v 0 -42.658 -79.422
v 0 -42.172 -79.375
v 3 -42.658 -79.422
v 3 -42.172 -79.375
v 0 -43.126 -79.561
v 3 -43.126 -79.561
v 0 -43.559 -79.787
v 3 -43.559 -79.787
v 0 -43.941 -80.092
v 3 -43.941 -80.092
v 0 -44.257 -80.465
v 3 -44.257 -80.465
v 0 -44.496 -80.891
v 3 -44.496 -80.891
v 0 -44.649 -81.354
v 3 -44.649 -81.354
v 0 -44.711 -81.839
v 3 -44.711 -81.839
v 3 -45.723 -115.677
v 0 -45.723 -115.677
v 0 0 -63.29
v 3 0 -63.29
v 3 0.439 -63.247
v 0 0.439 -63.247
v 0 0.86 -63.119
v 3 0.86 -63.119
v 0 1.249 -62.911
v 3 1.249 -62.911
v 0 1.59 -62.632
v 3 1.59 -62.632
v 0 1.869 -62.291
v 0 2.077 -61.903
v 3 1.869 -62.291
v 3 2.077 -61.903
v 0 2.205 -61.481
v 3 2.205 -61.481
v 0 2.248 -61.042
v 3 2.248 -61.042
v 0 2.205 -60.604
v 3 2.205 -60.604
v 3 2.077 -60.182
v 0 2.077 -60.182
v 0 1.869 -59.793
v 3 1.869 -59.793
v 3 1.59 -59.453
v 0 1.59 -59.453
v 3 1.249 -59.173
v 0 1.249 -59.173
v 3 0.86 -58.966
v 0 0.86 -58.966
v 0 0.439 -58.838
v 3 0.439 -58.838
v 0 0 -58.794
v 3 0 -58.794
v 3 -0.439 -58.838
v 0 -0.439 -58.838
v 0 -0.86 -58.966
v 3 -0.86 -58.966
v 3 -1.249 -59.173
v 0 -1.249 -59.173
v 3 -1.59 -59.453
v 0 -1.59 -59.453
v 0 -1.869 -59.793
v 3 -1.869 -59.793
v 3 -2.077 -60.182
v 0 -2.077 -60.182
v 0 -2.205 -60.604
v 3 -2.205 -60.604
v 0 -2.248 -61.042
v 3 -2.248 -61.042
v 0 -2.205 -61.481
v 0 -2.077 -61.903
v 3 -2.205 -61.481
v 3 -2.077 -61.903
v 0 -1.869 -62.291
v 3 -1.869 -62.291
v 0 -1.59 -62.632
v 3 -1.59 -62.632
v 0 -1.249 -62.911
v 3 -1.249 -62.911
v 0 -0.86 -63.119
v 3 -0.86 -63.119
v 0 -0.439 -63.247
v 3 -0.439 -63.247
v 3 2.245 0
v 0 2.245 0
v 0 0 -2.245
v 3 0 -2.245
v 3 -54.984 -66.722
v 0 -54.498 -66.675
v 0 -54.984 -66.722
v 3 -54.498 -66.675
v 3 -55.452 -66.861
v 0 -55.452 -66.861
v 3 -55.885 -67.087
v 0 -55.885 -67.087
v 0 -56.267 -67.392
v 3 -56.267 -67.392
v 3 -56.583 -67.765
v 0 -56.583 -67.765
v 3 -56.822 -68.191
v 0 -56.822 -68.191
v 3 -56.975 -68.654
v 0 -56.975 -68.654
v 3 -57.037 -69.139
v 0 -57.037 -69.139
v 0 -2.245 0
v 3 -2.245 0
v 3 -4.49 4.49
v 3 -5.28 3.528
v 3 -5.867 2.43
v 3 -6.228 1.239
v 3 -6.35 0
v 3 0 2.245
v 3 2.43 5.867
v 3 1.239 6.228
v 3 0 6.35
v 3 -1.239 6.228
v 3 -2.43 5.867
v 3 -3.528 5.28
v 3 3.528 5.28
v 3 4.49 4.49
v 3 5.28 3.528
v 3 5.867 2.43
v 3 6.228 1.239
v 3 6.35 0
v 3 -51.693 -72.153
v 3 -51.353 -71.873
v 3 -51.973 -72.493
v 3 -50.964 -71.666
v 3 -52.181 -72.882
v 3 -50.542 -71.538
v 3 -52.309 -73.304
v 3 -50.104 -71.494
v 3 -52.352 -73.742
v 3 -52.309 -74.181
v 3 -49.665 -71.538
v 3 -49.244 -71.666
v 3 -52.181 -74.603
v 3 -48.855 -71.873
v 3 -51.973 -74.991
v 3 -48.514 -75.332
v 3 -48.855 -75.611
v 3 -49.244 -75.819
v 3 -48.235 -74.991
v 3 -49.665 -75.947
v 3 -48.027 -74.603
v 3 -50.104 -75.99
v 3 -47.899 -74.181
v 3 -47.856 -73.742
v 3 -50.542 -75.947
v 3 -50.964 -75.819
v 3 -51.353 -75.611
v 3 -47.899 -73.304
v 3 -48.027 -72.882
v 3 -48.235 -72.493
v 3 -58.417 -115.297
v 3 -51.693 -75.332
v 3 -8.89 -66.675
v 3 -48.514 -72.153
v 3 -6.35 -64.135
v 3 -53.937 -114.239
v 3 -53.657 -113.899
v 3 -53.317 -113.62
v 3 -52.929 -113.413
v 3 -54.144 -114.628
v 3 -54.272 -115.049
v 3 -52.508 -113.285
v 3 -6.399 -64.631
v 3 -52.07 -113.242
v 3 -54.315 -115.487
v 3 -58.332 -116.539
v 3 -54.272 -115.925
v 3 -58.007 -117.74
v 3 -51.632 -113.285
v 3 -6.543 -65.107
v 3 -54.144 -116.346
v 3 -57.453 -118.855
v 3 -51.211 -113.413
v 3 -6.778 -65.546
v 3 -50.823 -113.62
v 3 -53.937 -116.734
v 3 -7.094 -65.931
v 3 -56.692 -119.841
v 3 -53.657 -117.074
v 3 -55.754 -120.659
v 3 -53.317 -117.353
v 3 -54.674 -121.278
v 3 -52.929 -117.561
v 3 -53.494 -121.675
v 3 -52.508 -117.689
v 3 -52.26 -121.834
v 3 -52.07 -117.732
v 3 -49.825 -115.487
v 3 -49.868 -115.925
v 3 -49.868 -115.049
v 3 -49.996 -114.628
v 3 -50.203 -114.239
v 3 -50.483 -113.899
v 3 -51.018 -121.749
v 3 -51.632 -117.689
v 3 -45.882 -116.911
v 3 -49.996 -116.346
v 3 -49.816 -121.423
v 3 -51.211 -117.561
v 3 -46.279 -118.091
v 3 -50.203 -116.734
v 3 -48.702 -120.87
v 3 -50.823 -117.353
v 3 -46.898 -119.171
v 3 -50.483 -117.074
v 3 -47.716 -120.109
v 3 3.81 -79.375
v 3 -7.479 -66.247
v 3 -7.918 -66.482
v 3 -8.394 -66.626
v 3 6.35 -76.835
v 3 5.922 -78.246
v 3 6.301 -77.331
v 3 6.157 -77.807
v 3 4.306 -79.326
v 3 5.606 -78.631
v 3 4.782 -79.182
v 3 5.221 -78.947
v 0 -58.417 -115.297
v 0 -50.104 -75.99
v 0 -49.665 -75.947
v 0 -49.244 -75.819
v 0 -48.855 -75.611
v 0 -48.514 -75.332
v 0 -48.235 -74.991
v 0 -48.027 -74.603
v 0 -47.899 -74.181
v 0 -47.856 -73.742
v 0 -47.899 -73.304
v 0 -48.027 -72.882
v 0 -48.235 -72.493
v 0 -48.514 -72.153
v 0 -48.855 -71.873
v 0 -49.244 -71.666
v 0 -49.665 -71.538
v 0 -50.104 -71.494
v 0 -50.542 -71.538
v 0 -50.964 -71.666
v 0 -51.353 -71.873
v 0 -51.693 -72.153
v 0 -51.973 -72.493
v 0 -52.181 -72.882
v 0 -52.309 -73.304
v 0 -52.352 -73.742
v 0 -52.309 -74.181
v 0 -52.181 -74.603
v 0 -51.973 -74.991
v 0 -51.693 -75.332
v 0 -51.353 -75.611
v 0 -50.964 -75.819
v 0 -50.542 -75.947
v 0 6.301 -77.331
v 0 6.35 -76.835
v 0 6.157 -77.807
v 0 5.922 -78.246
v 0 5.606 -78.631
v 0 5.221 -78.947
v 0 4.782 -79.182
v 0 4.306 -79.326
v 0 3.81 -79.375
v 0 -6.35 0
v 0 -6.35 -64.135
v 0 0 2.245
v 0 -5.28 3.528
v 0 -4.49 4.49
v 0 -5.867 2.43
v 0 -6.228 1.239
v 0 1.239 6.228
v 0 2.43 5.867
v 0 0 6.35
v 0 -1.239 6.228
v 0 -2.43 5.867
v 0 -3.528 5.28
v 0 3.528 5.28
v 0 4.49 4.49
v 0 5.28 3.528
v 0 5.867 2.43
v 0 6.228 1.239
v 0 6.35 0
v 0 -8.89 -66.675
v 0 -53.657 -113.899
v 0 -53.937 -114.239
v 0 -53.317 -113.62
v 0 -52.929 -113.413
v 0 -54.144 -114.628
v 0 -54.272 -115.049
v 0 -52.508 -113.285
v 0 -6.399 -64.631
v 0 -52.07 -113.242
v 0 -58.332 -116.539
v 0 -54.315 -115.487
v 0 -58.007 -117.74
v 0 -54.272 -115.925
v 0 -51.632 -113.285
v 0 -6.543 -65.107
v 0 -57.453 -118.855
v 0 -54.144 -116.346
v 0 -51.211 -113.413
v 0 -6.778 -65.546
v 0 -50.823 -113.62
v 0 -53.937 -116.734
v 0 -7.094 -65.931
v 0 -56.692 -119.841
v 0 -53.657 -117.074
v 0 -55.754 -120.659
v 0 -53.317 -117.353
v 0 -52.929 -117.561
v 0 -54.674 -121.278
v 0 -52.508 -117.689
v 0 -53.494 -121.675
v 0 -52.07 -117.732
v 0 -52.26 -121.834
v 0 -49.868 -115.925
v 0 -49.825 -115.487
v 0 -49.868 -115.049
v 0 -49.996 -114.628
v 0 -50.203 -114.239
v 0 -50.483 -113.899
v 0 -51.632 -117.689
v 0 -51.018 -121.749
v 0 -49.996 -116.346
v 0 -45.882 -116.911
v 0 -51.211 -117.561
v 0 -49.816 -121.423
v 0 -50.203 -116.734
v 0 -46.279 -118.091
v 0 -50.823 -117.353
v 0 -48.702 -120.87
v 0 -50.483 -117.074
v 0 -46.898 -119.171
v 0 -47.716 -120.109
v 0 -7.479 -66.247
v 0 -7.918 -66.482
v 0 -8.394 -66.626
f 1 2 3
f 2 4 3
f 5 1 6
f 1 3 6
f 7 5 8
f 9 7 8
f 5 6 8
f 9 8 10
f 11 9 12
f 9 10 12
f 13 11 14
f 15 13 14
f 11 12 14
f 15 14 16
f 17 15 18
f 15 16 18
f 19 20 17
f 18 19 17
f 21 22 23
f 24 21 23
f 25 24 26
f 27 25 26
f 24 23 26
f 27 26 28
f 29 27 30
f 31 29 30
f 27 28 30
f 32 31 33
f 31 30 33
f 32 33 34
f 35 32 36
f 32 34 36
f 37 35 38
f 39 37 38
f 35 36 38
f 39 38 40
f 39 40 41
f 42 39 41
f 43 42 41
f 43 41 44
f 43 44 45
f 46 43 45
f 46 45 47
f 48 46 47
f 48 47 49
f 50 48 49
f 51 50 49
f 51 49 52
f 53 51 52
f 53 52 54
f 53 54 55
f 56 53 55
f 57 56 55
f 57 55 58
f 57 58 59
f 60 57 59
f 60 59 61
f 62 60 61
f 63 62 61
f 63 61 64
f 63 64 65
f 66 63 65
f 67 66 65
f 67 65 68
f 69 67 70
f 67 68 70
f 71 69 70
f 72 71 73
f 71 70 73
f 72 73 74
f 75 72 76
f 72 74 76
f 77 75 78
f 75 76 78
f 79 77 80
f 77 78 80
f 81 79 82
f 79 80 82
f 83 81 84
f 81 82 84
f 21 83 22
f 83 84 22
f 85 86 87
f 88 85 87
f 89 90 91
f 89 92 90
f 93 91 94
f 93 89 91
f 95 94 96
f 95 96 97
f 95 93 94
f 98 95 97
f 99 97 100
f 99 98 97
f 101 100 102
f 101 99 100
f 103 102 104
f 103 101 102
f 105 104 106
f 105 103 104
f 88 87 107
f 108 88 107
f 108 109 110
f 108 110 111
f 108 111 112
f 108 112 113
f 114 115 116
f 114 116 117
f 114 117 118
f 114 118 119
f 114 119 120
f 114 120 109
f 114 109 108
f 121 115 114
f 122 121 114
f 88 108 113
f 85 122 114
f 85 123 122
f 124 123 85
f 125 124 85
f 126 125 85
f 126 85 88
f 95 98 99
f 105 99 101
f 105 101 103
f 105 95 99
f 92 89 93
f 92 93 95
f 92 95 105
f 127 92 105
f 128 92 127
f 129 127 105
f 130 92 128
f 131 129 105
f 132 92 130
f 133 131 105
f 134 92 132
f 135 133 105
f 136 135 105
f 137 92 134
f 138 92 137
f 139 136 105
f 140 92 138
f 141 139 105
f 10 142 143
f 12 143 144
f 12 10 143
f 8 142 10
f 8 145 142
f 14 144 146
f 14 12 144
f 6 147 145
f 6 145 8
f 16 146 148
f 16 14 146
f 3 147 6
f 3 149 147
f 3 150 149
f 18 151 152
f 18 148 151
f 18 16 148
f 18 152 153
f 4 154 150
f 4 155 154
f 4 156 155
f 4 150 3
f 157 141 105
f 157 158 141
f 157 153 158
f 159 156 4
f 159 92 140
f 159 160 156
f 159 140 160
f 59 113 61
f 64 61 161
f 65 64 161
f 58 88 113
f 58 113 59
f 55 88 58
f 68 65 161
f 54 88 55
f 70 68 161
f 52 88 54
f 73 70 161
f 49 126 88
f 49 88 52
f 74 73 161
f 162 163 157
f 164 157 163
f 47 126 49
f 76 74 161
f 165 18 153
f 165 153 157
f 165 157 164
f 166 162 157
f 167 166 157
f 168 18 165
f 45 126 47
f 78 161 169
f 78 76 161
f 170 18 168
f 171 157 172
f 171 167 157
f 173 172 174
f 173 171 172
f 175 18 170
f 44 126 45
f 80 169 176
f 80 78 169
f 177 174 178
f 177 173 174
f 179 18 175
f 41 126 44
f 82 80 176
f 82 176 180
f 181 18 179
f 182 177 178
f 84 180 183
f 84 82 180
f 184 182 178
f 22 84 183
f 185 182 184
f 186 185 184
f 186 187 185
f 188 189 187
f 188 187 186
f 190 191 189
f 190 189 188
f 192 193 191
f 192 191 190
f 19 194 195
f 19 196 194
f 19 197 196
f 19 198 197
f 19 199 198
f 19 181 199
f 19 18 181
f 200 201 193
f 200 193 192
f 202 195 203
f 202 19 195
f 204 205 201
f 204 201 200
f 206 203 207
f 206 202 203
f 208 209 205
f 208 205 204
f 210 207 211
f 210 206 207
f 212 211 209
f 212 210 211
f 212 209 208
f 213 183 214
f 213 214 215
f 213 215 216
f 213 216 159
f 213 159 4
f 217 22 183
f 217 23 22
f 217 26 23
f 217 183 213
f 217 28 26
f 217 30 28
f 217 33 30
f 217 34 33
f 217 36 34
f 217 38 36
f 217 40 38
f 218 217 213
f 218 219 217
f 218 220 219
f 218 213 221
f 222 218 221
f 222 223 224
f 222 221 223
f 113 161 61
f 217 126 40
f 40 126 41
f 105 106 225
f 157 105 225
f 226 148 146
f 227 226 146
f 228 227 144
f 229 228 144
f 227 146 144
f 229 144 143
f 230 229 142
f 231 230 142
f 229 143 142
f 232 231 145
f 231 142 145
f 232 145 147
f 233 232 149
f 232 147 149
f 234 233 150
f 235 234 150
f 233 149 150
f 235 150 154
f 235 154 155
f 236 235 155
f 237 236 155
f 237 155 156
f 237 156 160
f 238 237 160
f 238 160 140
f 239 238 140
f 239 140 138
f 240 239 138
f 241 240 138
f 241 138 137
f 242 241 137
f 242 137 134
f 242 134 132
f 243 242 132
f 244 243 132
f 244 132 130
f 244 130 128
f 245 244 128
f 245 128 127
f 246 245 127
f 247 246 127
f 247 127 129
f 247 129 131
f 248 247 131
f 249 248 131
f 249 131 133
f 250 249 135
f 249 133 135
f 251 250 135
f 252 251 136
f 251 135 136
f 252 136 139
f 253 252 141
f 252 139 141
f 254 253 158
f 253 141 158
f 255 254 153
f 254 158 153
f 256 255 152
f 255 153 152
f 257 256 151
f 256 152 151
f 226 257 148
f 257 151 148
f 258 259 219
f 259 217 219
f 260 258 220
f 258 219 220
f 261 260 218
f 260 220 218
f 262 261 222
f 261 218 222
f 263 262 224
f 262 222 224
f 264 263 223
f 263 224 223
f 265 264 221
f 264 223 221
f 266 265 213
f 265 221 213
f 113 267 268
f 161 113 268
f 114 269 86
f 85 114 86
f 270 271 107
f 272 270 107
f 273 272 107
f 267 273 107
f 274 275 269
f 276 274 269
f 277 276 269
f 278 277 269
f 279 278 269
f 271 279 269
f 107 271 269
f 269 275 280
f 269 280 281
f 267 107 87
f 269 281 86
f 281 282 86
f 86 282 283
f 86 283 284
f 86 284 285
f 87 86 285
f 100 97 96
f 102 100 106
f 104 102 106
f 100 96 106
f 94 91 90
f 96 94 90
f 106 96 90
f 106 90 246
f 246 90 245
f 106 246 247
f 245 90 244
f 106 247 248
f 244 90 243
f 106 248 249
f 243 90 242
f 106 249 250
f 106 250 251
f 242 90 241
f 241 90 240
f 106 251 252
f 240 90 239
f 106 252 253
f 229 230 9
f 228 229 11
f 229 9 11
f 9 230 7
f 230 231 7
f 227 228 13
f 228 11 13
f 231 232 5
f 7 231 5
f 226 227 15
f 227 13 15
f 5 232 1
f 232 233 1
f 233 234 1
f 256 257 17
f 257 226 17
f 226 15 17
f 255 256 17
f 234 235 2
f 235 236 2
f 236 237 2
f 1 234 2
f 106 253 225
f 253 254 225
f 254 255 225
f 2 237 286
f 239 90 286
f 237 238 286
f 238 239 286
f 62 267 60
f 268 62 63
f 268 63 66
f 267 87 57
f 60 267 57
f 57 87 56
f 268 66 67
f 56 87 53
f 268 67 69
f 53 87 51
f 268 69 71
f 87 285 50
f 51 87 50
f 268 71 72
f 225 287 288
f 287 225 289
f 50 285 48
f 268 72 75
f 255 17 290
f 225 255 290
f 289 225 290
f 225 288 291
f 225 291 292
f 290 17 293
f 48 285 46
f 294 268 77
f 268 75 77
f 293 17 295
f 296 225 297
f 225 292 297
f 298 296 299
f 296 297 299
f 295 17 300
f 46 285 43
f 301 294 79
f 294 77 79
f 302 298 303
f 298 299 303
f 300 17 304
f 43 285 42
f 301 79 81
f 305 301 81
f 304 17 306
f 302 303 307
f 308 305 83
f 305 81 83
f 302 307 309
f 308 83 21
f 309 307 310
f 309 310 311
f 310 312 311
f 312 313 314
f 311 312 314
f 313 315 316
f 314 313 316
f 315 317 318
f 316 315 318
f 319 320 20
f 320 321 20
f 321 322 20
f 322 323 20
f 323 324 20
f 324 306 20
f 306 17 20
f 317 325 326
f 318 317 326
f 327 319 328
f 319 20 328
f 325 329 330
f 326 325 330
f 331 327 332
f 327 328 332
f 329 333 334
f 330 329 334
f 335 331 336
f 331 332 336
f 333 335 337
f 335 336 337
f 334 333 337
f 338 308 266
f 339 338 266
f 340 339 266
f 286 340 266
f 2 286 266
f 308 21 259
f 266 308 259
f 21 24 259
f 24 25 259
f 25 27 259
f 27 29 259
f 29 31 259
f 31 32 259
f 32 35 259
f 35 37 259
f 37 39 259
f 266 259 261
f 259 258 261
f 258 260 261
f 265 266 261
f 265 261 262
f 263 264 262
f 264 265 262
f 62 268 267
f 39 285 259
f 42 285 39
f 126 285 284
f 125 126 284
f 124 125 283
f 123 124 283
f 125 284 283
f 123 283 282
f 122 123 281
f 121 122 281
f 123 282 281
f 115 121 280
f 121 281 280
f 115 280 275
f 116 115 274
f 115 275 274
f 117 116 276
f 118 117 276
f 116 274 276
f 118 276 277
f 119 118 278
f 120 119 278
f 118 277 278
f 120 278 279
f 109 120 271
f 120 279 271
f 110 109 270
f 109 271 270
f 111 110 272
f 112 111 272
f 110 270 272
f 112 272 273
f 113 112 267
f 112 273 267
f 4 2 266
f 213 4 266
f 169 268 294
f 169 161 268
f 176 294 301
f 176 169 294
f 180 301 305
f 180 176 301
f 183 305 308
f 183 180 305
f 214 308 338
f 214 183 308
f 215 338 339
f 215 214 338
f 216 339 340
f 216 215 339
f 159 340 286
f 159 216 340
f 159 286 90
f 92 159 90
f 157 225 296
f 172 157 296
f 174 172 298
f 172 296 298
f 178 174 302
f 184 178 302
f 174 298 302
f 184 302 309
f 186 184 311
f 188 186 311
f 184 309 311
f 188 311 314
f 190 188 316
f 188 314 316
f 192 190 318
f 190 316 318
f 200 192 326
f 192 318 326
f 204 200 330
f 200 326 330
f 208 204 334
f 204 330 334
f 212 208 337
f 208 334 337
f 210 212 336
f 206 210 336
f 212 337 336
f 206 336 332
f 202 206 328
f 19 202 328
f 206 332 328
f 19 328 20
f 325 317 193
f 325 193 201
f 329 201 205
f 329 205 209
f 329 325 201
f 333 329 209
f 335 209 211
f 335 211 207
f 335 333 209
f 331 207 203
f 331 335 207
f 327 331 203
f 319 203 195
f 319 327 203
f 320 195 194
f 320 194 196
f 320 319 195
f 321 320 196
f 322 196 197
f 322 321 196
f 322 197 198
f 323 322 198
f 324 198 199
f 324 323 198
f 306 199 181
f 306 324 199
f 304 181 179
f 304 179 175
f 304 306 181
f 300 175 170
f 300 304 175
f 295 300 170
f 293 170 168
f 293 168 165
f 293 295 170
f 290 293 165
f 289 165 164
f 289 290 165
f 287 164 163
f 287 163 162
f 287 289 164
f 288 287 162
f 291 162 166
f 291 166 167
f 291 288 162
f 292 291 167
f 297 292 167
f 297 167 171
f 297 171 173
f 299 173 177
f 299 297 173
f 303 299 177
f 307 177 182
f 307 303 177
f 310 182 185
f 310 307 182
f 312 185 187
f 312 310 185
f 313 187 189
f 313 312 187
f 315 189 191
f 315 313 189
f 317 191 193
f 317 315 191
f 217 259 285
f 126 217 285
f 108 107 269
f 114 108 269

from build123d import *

# Parameters (mm, degrees)
SKETCH1_R               = 2.24506403
BOSS_EXTRUDE1_DEPTH     = 3
FILLET1_R               = 2.54
SKETCH2_R               = 2.2479
TORQUE_PREVENTION_DEPTH = 136.15202741


with BuildPart() as part:
    # Sketch1 → Boss-Extrude1 (new body)
    with BuildSketch(Plane(origin=(0, 0, 0), x_dir=(0, 0, -1), z_dir=(1, 0, 0))):
        with BuildLine():
            Line((0, -6.35), (66.675, -6.35))
            Line((66.675, -6.35), (66.675, -56.962915387))
            Line((66.675, -56.962915387), (115.296830482, -58.417161651))
            ThreePointArc((115.296830482, -58.417161651), (121.833831472, -52.259839338), (115.676509159, -45.722838349))
            Line((115.676509159, -45.722838349), (79.375, -44.637084613))
            Line((79.375, -44.637084613), (79.375, 6.35))
            Line((79.375, 6.35), (0, 6.35))
            ThreePointArc((0, 6.35), (-6.35, 0), (0, -6.35))
        make_face()
        with Locations((115.486669821, -52.07)):
            Circle(SKETCH1_R, mode=Mode.SUBTRACT)
        Polygon((0, 2.24506403), (2.24506403, 0), (0, -2.24506403), (-2.24506403, 0), align=None, mode=Mode.SUBTRACT)
    extrude(amount=BOSS_EXTRUDE1_DEPTH)

    # Fillet1
    fillet1_edges = [part.edges().sort_by_distance(p)[0] for p in [
        (1.5, 6.35, -79.375),
        (1.5, -44.637084613, -79.375),
        (1.5, -56.962915387, -66.675),
        (1.5, -6.35, -66.675),
    ]]
    fillet(fillet1_edges, radius=FILLET1_R)

    # Sketch2 → Torque prevention (cut, through all)
    with BuildSketch(Plane(origin=(3, 0, 0), x_dir=(0, 0, -1), z_dir=(1, 0, 0))):
        with Locations((73.742299151, -50.103834019)):
            Circle(SKETCH2_R)
        with Locations((61.042299151, 0)):
            Circle(SKETCH2_R)
    extrude(amount=-TORQUE_PREVENTION_DEPTH, mode=Mode.SUBTRACT)


solid = part.part
